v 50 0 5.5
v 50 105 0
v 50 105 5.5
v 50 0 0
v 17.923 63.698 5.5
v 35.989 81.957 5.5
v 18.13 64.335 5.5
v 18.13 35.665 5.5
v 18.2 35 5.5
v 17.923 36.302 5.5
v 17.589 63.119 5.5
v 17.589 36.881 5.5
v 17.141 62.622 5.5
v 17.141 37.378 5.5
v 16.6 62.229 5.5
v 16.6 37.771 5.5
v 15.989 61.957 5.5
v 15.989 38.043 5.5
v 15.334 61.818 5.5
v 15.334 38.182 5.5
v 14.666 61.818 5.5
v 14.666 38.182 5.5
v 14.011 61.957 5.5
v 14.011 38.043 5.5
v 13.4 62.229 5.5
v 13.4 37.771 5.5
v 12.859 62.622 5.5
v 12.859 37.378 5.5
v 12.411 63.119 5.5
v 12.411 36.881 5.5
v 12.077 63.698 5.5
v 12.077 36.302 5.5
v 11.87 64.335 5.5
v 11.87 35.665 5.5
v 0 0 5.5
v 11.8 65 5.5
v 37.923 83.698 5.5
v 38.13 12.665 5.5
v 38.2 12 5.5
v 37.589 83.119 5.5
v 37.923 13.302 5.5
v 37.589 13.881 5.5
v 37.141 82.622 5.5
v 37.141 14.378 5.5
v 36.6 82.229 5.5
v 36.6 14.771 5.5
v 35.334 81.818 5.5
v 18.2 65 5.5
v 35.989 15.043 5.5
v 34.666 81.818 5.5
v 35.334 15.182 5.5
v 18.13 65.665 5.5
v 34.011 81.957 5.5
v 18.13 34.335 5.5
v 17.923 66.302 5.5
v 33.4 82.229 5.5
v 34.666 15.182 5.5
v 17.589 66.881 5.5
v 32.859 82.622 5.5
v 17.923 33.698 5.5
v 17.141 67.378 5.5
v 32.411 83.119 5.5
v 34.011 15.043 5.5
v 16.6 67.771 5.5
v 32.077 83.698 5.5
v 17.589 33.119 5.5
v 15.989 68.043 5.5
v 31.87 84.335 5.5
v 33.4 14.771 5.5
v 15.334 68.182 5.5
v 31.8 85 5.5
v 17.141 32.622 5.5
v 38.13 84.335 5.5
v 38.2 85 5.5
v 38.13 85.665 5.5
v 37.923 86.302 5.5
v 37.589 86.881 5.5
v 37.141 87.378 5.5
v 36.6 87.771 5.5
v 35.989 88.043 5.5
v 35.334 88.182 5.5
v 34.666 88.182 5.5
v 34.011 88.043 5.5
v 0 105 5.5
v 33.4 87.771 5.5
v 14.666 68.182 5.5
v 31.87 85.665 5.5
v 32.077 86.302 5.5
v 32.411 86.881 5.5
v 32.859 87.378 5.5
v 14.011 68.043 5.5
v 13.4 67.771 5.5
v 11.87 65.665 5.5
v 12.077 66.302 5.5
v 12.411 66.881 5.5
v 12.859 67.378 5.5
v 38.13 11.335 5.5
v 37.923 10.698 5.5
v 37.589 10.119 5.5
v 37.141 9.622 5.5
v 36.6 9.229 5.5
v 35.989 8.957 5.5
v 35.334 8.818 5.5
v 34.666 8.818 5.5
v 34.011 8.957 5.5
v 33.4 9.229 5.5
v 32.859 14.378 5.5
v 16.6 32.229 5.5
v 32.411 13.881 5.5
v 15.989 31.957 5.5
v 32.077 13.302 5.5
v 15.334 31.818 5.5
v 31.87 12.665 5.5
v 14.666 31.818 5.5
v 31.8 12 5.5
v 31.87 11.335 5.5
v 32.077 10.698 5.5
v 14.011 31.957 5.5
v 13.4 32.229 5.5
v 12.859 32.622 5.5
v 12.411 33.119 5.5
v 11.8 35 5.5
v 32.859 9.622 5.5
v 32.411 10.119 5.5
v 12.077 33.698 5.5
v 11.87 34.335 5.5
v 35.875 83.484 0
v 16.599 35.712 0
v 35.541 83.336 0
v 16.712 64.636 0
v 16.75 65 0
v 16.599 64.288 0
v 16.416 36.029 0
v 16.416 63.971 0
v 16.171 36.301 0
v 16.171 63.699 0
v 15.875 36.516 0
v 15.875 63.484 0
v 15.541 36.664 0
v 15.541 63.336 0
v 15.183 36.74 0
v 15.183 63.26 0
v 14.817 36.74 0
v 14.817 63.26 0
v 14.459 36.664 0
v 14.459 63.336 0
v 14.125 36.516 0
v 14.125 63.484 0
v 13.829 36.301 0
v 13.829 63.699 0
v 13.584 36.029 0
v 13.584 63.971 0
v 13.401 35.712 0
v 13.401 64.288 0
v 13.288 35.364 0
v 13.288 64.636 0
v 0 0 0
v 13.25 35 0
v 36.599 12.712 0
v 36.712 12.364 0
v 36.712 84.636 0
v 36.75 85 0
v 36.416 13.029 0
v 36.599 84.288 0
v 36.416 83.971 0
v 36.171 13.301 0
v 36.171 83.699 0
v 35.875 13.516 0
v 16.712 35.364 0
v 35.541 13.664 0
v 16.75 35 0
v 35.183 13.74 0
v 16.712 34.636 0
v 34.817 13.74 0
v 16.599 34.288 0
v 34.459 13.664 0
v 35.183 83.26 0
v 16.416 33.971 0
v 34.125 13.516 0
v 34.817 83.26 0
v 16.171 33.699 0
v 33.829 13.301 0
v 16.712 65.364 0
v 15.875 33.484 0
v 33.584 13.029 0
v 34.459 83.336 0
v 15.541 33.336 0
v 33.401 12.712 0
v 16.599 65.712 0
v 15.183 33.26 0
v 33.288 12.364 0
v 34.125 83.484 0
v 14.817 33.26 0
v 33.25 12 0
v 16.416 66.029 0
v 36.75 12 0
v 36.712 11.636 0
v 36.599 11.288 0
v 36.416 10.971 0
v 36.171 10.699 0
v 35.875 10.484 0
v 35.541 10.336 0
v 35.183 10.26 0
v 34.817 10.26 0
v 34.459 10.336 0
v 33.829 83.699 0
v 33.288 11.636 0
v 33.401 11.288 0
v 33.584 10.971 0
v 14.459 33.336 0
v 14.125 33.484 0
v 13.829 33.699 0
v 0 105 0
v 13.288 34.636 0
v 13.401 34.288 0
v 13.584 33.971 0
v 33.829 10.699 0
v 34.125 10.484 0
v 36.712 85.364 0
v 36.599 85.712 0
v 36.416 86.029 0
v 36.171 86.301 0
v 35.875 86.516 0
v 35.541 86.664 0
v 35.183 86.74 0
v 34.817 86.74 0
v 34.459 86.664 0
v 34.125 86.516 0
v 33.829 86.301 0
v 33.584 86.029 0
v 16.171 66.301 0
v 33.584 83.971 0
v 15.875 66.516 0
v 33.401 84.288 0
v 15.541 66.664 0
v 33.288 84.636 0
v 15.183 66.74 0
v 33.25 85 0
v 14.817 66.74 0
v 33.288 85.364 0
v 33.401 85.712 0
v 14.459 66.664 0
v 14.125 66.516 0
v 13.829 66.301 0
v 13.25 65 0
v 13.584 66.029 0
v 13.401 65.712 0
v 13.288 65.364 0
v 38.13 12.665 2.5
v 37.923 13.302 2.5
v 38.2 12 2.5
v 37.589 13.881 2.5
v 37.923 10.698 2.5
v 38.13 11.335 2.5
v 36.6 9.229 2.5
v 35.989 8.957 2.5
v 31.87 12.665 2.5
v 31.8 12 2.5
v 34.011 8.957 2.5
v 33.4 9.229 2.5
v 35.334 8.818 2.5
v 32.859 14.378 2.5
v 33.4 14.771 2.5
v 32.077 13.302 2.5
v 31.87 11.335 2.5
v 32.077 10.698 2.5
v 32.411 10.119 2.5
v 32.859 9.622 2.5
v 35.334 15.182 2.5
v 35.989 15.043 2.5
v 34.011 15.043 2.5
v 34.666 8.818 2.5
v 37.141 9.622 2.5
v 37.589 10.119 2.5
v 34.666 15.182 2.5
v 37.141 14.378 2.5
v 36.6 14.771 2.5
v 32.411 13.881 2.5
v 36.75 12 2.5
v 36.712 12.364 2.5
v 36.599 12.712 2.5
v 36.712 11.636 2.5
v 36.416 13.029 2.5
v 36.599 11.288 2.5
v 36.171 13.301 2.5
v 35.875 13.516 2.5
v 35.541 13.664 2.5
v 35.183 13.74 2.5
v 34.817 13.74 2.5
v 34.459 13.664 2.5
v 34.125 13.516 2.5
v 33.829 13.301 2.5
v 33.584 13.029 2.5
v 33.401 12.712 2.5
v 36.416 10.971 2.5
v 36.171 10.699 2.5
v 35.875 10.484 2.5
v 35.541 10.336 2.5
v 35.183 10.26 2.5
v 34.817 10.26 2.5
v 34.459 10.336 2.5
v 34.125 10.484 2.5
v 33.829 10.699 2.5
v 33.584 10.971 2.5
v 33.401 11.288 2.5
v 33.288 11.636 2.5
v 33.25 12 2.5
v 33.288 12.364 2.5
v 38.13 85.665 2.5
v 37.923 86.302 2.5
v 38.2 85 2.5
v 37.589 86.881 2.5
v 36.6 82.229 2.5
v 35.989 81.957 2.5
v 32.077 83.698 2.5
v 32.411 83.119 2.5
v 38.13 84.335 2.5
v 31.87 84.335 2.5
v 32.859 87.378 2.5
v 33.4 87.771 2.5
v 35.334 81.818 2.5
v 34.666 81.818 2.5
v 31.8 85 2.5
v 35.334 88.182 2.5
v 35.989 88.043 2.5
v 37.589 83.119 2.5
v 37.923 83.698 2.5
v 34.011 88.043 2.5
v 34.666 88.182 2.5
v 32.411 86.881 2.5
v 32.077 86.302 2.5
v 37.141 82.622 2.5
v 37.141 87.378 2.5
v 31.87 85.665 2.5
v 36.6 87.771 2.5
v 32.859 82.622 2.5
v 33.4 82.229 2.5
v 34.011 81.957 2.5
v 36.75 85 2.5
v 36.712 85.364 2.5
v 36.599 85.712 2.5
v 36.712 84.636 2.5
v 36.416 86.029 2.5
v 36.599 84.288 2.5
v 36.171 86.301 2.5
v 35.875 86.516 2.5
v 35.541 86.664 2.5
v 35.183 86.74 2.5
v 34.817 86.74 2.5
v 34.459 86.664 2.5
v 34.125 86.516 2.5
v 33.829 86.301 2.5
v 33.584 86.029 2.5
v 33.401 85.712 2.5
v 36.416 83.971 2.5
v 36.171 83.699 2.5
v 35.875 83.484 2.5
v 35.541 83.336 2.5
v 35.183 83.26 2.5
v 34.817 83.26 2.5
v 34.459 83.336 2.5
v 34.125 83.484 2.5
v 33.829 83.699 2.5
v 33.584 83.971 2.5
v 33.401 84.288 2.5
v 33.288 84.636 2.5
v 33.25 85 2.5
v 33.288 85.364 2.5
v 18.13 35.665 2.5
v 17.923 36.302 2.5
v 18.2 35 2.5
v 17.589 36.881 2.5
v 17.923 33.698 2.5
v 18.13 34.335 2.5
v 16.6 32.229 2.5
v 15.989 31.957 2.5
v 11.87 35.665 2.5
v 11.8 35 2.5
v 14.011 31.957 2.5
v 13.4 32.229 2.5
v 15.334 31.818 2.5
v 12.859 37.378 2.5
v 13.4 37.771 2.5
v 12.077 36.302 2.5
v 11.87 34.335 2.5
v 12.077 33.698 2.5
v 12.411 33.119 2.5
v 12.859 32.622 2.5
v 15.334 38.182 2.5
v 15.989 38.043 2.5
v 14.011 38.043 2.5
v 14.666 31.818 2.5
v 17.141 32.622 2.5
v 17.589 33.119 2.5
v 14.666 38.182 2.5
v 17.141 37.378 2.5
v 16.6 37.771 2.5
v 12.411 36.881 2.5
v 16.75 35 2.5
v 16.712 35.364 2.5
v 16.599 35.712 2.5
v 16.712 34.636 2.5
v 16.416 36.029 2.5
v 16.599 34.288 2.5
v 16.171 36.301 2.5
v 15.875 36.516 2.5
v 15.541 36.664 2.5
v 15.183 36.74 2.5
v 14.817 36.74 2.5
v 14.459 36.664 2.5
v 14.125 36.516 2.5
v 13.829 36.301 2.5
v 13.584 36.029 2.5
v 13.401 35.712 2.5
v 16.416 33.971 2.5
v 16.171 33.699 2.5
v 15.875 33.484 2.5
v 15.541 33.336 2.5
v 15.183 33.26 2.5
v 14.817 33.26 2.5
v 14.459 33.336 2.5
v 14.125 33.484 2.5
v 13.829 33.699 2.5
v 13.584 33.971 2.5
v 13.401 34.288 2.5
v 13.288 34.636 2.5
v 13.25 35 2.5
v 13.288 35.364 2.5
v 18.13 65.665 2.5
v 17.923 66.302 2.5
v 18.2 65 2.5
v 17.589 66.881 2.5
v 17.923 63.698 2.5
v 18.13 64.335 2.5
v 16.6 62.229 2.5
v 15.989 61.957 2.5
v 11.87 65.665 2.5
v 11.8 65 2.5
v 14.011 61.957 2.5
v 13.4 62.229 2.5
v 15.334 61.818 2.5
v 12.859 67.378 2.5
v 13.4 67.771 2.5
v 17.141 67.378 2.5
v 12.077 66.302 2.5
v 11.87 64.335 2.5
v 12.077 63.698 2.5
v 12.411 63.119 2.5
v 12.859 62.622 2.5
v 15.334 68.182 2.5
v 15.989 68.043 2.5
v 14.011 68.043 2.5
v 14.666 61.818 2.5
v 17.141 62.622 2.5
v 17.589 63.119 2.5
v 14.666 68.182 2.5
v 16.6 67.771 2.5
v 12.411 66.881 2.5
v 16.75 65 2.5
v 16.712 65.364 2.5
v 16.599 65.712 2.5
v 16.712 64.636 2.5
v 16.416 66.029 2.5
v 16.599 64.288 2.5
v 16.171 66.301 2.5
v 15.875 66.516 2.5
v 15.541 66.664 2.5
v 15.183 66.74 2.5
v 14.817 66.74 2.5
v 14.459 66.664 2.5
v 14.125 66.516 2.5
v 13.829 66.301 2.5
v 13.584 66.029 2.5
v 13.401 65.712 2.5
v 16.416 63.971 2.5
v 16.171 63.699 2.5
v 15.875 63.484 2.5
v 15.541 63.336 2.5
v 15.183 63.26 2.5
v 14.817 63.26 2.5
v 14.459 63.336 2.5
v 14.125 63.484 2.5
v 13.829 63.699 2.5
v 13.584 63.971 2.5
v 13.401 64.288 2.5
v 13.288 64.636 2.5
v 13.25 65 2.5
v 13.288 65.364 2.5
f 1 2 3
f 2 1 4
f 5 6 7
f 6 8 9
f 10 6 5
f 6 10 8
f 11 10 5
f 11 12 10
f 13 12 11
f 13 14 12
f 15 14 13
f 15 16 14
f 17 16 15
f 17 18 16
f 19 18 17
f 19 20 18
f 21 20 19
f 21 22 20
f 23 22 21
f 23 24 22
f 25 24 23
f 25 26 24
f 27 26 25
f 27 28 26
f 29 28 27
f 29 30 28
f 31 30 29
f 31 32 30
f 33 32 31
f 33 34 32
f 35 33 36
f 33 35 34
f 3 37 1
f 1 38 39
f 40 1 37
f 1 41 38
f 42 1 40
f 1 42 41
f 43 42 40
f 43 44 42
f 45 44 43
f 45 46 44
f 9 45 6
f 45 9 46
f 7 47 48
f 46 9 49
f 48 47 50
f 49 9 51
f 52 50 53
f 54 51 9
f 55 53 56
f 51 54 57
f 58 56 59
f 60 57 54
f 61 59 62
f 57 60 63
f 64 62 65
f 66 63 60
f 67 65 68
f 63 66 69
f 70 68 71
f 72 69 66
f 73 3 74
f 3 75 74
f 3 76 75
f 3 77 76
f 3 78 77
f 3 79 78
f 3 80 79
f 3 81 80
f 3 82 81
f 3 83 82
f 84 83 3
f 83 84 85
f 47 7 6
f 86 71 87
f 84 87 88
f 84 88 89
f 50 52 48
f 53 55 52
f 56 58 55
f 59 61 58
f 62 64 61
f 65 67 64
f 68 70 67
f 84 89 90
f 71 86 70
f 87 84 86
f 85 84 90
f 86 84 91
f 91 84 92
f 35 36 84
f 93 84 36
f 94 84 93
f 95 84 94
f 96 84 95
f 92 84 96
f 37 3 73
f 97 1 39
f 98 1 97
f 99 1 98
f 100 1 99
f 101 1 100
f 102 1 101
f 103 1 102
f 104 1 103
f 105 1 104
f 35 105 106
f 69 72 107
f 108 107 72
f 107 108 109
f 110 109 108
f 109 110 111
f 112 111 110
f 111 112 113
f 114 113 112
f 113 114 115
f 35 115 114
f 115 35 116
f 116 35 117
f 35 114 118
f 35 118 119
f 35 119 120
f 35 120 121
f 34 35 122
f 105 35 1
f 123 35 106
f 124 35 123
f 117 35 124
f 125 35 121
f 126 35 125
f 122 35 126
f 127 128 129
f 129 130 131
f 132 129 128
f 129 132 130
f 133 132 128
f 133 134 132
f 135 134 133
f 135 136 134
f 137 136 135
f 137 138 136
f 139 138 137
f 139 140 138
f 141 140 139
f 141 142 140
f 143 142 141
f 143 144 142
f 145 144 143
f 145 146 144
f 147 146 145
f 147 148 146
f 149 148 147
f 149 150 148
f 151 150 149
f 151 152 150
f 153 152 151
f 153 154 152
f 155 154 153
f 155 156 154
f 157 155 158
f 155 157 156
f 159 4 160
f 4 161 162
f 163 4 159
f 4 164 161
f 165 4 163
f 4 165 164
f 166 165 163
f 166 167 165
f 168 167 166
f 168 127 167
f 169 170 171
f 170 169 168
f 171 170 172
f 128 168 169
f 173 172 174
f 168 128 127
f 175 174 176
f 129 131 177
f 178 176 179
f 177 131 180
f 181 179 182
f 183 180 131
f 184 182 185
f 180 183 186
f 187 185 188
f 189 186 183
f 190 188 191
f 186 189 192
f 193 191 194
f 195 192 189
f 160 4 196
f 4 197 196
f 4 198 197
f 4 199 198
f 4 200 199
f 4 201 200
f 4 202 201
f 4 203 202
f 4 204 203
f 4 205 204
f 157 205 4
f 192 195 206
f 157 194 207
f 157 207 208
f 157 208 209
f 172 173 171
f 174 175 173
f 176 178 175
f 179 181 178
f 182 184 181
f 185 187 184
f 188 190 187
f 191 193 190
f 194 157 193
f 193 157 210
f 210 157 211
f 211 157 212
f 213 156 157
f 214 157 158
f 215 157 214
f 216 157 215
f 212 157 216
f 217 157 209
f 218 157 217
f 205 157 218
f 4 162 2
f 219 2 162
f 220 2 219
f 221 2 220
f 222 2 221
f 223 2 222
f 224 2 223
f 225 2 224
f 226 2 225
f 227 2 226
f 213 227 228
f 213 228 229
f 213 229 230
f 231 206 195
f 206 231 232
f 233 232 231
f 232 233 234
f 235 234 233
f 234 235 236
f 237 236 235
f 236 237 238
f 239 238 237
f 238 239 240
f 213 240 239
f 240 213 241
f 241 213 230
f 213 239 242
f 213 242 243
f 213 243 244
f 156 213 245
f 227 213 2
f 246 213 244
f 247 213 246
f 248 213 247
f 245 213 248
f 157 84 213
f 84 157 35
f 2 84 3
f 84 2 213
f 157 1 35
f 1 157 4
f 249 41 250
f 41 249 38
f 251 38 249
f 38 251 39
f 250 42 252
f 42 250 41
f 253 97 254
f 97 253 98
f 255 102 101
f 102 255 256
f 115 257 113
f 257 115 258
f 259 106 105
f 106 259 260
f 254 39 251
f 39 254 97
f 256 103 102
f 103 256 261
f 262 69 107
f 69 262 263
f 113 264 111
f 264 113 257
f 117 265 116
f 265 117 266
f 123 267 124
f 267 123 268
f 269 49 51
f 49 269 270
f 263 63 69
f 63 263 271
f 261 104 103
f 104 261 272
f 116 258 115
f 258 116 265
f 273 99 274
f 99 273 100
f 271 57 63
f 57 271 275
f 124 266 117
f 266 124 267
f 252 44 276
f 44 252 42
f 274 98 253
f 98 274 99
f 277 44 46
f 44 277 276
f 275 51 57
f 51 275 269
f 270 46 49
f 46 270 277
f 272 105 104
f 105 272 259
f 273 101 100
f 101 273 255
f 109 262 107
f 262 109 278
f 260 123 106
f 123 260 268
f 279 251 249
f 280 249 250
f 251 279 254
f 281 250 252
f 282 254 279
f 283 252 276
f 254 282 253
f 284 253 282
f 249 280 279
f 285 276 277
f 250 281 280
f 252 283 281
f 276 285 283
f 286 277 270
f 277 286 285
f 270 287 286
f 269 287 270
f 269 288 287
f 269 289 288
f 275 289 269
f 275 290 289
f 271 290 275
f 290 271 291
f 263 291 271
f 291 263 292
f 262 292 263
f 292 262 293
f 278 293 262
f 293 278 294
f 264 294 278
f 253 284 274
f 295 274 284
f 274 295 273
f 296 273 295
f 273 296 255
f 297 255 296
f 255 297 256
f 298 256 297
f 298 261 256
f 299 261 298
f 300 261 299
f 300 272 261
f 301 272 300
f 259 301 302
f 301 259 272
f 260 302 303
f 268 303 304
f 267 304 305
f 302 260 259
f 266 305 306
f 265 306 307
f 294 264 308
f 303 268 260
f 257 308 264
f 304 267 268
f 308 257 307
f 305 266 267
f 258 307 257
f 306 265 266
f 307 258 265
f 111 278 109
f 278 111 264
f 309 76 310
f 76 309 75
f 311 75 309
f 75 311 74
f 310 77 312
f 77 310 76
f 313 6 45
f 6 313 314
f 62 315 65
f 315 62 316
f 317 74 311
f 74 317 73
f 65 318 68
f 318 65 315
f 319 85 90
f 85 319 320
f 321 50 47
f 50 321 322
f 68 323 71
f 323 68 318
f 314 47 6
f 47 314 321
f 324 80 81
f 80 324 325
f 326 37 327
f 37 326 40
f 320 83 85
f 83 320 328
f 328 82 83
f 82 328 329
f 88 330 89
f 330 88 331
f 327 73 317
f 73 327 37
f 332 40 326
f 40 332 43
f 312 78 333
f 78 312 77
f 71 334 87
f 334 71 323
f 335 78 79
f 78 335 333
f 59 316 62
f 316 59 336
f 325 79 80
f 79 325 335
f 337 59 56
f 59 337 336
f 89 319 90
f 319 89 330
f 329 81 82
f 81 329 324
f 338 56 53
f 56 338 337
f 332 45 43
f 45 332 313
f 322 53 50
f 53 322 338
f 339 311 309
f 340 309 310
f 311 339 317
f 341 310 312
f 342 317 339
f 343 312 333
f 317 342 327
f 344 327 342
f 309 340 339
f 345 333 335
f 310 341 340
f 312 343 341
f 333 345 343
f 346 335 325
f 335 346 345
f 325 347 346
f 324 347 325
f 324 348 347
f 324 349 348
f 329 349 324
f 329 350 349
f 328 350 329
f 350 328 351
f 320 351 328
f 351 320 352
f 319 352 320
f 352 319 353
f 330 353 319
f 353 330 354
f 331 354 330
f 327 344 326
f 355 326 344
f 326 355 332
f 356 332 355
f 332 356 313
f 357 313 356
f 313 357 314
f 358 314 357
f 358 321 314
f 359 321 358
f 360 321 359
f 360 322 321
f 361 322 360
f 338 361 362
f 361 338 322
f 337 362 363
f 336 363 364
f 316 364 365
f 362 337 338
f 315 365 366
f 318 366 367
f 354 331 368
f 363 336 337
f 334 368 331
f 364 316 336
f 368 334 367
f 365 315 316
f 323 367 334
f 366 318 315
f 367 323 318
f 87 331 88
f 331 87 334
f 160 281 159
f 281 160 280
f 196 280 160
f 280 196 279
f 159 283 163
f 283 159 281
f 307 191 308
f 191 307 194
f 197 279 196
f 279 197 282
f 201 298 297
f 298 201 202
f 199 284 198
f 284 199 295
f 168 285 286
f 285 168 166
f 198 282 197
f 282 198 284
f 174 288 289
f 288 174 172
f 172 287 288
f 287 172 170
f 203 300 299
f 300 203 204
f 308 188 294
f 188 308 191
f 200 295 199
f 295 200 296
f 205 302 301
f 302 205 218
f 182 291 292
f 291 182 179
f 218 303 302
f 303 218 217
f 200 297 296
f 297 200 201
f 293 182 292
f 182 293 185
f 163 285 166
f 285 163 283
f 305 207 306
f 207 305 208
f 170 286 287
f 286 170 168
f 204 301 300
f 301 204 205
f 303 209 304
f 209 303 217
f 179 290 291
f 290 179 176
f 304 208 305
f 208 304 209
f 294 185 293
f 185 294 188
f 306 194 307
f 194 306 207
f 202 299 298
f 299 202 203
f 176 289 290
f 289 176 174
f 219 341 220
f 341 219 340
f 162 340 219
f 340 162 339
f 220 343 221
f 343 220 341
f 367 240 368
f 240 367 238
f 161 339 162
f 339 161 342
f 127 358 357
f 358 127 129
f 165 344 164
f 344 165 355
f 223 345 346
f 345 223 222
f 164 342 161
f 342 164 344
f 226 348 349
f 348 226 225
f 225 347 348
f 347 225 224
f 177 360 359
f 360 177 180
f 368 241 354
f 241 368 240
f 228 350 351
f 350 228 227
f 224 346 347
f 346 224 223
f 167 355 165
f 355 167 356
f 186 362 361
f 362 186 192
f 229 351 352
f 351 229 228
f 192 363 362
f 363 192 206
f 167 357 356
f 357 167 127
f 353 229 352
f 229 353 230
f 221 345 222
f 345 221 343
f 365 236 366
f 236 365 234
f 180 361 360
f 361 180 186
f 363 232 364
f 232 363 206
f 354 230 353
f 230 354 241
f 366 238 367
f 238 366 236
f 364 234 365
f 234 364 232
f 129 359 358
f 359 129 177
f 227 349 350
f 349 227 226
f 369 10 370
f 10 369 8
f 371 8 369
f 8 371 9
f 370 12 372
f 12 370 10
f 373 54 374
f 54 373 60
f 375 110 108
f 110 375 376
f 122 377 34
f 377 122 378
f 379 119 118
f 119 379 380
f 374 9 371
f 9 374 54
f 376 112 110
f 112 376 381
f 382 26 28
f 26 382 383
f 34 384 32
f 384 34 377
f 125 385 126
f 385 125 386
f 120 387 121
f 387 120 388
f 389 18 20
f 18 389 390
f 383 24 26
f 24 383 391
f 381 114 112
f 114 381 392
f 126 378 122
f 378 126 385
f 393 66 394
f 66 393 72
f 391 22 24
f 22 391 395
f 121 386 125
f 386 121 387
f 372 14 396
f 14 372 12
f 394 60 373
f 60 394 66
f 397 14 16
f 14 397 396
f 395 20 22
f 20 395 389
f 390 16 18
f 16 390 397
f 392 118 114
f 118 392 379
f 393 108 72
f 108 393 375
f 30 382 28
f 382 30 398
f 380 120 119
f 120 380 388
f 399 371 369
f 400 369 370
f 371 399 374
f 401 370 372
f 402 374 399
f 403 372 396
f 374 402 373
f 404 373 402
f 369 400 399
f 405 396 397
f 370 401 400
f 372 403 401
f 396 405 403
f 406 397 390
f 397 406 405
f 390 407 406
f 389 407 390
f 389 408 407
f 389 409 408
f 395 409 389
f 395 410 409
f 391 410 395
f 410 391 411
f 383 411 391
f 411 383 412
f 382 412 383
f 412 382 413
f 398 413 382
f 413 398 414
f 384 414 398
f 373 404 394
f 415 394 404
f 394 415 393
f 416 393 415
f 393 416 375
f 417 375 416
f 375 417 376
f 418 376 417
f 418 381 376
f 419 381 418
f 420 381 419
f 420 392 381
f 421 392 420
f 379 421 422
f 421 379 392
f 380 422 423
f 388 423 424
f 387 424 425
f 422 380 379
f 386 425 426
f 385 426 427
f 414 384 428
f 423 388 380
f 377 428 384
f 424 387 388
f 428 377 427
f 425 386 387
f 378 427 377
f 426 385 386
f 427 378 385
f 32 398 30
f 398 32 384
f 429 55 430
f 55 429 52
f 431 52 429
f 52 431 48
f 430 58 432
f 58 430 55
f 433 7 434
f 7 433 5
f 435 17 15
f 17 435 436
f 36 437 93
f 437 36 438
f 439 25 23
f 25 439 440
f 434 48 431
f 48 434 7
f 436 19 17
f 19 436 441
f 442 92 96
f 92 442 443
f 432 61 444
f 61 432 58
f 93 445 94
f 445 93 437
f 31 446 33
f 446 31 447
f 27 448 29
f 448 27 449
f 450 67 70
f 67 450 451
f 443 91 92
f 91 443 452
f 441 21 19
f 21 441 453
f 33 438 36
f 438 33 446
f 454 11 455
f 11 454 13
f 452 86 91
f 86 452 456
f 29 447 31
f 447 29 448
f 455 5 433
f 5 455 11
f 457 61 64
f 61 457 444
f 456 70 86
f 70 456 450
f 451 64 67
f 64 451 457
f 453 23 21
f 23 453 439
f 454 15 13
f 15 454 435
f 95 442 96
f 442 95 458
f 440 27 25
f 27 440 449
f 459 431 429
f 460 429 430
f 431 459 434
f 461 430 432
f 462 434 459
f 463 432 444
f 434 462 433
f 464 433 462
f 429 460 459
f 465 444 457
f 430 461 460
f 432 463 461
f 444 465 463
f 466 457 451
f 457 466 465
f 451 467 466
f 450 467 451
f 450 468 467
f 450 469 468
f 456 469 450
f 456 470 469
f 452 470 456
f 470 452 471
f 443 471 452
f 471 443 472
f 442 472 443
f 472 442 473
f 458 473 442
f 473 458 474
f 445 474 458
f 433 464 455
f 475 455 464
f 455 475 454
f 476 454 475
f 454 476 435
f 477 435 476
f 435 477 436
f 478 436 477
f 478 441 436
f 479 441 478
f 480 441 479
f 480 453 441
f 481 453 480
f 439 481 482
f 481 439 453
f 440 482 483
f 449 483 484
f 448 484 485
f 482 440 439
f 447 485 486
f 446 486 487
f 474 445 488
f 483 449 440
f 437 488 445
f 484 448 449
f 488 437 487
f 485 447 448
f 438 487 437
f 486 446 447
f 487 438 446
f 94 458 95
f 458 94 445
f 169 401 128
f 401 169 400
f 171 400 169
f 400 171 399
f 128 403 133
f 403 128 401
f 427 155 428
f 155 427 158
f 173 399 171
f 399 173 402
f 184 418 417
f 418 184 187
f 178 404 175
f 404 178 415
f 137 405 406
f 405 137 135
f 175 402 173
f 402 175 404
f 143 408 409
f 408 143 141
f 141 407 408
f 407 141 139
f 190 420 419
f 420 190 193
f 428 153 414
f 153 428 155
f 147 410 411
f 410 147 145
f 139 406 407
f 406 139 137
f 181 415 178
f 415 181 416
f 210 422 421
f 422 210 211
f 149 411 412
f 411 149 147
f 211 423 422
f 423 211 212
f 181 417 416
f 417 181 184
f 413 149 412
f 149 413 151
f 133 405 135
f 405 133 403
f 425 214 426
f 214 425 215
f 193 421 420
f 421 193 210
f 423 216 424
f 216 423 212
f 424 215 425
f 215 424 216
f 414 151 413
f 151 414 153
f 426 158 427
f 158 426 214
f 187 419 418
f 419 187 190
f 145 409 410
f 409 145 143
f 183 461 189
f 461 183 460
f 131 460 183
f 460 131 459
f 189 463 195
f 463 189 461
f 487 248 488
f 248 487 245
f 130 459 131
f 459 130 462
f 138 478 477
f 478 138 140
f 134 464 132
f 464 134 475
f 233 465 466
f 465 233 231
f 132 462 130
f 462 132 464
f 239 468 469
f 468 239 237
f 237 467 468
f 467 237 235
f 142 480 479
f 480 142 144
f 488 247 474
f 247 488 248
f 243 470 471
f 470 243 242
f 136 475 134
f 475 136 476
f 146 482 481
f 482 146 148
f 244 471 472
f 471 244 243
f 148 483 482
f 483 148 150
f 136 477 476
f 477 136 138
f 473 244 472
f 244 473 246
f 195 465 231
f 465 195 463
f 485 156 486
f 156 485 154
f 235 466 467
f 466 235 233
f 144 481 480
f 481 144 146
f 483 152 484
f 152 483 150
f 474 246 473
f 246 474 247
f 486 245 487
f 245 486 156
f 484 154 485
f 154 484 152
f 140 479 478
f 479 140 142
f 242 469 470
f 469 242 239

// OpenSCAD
//kossel 2020 (bowden) extruder mount - mounts to vertical extrusion

$fn=30;

screw_diameter = 3.5;
screw_head = 6.4;

difference(){
    //main body
    cube([50,105,5.5]);

    //holes for screw head
    translate([35,12,2.5]) cylinder(20,d=screw_head);
    translate([35,85,2.5]) cylinder(20,d=screw_head);
    
    //screw holes for mounting to extrusion
    translate([35,12,-1]) cylinder(20,d=screw_diameter);
    translate([35,85,-1]) cylinder(20,d=screw_diameter);
    
    //holes for screw head
    translate([15,35,2.5]) cylinder(20,d=screw_head);
    translate([15,65,2.5]) cylinder(20,d=screw_head);
    
    //screw holes for mounting extruder
    translate([15,35,-1]) cylinder(20,d=screw_diameter);
    translate([15,65,-1]) cylinder(20,d=screw_diameter);
    
    
    //rotate(45) translate([-15,-20,-1]) cube([35,40,50]);
    mirror([0,1,0]) rotate(45) translate([-15,50,-1]) cube([35,40,50]);
    }
